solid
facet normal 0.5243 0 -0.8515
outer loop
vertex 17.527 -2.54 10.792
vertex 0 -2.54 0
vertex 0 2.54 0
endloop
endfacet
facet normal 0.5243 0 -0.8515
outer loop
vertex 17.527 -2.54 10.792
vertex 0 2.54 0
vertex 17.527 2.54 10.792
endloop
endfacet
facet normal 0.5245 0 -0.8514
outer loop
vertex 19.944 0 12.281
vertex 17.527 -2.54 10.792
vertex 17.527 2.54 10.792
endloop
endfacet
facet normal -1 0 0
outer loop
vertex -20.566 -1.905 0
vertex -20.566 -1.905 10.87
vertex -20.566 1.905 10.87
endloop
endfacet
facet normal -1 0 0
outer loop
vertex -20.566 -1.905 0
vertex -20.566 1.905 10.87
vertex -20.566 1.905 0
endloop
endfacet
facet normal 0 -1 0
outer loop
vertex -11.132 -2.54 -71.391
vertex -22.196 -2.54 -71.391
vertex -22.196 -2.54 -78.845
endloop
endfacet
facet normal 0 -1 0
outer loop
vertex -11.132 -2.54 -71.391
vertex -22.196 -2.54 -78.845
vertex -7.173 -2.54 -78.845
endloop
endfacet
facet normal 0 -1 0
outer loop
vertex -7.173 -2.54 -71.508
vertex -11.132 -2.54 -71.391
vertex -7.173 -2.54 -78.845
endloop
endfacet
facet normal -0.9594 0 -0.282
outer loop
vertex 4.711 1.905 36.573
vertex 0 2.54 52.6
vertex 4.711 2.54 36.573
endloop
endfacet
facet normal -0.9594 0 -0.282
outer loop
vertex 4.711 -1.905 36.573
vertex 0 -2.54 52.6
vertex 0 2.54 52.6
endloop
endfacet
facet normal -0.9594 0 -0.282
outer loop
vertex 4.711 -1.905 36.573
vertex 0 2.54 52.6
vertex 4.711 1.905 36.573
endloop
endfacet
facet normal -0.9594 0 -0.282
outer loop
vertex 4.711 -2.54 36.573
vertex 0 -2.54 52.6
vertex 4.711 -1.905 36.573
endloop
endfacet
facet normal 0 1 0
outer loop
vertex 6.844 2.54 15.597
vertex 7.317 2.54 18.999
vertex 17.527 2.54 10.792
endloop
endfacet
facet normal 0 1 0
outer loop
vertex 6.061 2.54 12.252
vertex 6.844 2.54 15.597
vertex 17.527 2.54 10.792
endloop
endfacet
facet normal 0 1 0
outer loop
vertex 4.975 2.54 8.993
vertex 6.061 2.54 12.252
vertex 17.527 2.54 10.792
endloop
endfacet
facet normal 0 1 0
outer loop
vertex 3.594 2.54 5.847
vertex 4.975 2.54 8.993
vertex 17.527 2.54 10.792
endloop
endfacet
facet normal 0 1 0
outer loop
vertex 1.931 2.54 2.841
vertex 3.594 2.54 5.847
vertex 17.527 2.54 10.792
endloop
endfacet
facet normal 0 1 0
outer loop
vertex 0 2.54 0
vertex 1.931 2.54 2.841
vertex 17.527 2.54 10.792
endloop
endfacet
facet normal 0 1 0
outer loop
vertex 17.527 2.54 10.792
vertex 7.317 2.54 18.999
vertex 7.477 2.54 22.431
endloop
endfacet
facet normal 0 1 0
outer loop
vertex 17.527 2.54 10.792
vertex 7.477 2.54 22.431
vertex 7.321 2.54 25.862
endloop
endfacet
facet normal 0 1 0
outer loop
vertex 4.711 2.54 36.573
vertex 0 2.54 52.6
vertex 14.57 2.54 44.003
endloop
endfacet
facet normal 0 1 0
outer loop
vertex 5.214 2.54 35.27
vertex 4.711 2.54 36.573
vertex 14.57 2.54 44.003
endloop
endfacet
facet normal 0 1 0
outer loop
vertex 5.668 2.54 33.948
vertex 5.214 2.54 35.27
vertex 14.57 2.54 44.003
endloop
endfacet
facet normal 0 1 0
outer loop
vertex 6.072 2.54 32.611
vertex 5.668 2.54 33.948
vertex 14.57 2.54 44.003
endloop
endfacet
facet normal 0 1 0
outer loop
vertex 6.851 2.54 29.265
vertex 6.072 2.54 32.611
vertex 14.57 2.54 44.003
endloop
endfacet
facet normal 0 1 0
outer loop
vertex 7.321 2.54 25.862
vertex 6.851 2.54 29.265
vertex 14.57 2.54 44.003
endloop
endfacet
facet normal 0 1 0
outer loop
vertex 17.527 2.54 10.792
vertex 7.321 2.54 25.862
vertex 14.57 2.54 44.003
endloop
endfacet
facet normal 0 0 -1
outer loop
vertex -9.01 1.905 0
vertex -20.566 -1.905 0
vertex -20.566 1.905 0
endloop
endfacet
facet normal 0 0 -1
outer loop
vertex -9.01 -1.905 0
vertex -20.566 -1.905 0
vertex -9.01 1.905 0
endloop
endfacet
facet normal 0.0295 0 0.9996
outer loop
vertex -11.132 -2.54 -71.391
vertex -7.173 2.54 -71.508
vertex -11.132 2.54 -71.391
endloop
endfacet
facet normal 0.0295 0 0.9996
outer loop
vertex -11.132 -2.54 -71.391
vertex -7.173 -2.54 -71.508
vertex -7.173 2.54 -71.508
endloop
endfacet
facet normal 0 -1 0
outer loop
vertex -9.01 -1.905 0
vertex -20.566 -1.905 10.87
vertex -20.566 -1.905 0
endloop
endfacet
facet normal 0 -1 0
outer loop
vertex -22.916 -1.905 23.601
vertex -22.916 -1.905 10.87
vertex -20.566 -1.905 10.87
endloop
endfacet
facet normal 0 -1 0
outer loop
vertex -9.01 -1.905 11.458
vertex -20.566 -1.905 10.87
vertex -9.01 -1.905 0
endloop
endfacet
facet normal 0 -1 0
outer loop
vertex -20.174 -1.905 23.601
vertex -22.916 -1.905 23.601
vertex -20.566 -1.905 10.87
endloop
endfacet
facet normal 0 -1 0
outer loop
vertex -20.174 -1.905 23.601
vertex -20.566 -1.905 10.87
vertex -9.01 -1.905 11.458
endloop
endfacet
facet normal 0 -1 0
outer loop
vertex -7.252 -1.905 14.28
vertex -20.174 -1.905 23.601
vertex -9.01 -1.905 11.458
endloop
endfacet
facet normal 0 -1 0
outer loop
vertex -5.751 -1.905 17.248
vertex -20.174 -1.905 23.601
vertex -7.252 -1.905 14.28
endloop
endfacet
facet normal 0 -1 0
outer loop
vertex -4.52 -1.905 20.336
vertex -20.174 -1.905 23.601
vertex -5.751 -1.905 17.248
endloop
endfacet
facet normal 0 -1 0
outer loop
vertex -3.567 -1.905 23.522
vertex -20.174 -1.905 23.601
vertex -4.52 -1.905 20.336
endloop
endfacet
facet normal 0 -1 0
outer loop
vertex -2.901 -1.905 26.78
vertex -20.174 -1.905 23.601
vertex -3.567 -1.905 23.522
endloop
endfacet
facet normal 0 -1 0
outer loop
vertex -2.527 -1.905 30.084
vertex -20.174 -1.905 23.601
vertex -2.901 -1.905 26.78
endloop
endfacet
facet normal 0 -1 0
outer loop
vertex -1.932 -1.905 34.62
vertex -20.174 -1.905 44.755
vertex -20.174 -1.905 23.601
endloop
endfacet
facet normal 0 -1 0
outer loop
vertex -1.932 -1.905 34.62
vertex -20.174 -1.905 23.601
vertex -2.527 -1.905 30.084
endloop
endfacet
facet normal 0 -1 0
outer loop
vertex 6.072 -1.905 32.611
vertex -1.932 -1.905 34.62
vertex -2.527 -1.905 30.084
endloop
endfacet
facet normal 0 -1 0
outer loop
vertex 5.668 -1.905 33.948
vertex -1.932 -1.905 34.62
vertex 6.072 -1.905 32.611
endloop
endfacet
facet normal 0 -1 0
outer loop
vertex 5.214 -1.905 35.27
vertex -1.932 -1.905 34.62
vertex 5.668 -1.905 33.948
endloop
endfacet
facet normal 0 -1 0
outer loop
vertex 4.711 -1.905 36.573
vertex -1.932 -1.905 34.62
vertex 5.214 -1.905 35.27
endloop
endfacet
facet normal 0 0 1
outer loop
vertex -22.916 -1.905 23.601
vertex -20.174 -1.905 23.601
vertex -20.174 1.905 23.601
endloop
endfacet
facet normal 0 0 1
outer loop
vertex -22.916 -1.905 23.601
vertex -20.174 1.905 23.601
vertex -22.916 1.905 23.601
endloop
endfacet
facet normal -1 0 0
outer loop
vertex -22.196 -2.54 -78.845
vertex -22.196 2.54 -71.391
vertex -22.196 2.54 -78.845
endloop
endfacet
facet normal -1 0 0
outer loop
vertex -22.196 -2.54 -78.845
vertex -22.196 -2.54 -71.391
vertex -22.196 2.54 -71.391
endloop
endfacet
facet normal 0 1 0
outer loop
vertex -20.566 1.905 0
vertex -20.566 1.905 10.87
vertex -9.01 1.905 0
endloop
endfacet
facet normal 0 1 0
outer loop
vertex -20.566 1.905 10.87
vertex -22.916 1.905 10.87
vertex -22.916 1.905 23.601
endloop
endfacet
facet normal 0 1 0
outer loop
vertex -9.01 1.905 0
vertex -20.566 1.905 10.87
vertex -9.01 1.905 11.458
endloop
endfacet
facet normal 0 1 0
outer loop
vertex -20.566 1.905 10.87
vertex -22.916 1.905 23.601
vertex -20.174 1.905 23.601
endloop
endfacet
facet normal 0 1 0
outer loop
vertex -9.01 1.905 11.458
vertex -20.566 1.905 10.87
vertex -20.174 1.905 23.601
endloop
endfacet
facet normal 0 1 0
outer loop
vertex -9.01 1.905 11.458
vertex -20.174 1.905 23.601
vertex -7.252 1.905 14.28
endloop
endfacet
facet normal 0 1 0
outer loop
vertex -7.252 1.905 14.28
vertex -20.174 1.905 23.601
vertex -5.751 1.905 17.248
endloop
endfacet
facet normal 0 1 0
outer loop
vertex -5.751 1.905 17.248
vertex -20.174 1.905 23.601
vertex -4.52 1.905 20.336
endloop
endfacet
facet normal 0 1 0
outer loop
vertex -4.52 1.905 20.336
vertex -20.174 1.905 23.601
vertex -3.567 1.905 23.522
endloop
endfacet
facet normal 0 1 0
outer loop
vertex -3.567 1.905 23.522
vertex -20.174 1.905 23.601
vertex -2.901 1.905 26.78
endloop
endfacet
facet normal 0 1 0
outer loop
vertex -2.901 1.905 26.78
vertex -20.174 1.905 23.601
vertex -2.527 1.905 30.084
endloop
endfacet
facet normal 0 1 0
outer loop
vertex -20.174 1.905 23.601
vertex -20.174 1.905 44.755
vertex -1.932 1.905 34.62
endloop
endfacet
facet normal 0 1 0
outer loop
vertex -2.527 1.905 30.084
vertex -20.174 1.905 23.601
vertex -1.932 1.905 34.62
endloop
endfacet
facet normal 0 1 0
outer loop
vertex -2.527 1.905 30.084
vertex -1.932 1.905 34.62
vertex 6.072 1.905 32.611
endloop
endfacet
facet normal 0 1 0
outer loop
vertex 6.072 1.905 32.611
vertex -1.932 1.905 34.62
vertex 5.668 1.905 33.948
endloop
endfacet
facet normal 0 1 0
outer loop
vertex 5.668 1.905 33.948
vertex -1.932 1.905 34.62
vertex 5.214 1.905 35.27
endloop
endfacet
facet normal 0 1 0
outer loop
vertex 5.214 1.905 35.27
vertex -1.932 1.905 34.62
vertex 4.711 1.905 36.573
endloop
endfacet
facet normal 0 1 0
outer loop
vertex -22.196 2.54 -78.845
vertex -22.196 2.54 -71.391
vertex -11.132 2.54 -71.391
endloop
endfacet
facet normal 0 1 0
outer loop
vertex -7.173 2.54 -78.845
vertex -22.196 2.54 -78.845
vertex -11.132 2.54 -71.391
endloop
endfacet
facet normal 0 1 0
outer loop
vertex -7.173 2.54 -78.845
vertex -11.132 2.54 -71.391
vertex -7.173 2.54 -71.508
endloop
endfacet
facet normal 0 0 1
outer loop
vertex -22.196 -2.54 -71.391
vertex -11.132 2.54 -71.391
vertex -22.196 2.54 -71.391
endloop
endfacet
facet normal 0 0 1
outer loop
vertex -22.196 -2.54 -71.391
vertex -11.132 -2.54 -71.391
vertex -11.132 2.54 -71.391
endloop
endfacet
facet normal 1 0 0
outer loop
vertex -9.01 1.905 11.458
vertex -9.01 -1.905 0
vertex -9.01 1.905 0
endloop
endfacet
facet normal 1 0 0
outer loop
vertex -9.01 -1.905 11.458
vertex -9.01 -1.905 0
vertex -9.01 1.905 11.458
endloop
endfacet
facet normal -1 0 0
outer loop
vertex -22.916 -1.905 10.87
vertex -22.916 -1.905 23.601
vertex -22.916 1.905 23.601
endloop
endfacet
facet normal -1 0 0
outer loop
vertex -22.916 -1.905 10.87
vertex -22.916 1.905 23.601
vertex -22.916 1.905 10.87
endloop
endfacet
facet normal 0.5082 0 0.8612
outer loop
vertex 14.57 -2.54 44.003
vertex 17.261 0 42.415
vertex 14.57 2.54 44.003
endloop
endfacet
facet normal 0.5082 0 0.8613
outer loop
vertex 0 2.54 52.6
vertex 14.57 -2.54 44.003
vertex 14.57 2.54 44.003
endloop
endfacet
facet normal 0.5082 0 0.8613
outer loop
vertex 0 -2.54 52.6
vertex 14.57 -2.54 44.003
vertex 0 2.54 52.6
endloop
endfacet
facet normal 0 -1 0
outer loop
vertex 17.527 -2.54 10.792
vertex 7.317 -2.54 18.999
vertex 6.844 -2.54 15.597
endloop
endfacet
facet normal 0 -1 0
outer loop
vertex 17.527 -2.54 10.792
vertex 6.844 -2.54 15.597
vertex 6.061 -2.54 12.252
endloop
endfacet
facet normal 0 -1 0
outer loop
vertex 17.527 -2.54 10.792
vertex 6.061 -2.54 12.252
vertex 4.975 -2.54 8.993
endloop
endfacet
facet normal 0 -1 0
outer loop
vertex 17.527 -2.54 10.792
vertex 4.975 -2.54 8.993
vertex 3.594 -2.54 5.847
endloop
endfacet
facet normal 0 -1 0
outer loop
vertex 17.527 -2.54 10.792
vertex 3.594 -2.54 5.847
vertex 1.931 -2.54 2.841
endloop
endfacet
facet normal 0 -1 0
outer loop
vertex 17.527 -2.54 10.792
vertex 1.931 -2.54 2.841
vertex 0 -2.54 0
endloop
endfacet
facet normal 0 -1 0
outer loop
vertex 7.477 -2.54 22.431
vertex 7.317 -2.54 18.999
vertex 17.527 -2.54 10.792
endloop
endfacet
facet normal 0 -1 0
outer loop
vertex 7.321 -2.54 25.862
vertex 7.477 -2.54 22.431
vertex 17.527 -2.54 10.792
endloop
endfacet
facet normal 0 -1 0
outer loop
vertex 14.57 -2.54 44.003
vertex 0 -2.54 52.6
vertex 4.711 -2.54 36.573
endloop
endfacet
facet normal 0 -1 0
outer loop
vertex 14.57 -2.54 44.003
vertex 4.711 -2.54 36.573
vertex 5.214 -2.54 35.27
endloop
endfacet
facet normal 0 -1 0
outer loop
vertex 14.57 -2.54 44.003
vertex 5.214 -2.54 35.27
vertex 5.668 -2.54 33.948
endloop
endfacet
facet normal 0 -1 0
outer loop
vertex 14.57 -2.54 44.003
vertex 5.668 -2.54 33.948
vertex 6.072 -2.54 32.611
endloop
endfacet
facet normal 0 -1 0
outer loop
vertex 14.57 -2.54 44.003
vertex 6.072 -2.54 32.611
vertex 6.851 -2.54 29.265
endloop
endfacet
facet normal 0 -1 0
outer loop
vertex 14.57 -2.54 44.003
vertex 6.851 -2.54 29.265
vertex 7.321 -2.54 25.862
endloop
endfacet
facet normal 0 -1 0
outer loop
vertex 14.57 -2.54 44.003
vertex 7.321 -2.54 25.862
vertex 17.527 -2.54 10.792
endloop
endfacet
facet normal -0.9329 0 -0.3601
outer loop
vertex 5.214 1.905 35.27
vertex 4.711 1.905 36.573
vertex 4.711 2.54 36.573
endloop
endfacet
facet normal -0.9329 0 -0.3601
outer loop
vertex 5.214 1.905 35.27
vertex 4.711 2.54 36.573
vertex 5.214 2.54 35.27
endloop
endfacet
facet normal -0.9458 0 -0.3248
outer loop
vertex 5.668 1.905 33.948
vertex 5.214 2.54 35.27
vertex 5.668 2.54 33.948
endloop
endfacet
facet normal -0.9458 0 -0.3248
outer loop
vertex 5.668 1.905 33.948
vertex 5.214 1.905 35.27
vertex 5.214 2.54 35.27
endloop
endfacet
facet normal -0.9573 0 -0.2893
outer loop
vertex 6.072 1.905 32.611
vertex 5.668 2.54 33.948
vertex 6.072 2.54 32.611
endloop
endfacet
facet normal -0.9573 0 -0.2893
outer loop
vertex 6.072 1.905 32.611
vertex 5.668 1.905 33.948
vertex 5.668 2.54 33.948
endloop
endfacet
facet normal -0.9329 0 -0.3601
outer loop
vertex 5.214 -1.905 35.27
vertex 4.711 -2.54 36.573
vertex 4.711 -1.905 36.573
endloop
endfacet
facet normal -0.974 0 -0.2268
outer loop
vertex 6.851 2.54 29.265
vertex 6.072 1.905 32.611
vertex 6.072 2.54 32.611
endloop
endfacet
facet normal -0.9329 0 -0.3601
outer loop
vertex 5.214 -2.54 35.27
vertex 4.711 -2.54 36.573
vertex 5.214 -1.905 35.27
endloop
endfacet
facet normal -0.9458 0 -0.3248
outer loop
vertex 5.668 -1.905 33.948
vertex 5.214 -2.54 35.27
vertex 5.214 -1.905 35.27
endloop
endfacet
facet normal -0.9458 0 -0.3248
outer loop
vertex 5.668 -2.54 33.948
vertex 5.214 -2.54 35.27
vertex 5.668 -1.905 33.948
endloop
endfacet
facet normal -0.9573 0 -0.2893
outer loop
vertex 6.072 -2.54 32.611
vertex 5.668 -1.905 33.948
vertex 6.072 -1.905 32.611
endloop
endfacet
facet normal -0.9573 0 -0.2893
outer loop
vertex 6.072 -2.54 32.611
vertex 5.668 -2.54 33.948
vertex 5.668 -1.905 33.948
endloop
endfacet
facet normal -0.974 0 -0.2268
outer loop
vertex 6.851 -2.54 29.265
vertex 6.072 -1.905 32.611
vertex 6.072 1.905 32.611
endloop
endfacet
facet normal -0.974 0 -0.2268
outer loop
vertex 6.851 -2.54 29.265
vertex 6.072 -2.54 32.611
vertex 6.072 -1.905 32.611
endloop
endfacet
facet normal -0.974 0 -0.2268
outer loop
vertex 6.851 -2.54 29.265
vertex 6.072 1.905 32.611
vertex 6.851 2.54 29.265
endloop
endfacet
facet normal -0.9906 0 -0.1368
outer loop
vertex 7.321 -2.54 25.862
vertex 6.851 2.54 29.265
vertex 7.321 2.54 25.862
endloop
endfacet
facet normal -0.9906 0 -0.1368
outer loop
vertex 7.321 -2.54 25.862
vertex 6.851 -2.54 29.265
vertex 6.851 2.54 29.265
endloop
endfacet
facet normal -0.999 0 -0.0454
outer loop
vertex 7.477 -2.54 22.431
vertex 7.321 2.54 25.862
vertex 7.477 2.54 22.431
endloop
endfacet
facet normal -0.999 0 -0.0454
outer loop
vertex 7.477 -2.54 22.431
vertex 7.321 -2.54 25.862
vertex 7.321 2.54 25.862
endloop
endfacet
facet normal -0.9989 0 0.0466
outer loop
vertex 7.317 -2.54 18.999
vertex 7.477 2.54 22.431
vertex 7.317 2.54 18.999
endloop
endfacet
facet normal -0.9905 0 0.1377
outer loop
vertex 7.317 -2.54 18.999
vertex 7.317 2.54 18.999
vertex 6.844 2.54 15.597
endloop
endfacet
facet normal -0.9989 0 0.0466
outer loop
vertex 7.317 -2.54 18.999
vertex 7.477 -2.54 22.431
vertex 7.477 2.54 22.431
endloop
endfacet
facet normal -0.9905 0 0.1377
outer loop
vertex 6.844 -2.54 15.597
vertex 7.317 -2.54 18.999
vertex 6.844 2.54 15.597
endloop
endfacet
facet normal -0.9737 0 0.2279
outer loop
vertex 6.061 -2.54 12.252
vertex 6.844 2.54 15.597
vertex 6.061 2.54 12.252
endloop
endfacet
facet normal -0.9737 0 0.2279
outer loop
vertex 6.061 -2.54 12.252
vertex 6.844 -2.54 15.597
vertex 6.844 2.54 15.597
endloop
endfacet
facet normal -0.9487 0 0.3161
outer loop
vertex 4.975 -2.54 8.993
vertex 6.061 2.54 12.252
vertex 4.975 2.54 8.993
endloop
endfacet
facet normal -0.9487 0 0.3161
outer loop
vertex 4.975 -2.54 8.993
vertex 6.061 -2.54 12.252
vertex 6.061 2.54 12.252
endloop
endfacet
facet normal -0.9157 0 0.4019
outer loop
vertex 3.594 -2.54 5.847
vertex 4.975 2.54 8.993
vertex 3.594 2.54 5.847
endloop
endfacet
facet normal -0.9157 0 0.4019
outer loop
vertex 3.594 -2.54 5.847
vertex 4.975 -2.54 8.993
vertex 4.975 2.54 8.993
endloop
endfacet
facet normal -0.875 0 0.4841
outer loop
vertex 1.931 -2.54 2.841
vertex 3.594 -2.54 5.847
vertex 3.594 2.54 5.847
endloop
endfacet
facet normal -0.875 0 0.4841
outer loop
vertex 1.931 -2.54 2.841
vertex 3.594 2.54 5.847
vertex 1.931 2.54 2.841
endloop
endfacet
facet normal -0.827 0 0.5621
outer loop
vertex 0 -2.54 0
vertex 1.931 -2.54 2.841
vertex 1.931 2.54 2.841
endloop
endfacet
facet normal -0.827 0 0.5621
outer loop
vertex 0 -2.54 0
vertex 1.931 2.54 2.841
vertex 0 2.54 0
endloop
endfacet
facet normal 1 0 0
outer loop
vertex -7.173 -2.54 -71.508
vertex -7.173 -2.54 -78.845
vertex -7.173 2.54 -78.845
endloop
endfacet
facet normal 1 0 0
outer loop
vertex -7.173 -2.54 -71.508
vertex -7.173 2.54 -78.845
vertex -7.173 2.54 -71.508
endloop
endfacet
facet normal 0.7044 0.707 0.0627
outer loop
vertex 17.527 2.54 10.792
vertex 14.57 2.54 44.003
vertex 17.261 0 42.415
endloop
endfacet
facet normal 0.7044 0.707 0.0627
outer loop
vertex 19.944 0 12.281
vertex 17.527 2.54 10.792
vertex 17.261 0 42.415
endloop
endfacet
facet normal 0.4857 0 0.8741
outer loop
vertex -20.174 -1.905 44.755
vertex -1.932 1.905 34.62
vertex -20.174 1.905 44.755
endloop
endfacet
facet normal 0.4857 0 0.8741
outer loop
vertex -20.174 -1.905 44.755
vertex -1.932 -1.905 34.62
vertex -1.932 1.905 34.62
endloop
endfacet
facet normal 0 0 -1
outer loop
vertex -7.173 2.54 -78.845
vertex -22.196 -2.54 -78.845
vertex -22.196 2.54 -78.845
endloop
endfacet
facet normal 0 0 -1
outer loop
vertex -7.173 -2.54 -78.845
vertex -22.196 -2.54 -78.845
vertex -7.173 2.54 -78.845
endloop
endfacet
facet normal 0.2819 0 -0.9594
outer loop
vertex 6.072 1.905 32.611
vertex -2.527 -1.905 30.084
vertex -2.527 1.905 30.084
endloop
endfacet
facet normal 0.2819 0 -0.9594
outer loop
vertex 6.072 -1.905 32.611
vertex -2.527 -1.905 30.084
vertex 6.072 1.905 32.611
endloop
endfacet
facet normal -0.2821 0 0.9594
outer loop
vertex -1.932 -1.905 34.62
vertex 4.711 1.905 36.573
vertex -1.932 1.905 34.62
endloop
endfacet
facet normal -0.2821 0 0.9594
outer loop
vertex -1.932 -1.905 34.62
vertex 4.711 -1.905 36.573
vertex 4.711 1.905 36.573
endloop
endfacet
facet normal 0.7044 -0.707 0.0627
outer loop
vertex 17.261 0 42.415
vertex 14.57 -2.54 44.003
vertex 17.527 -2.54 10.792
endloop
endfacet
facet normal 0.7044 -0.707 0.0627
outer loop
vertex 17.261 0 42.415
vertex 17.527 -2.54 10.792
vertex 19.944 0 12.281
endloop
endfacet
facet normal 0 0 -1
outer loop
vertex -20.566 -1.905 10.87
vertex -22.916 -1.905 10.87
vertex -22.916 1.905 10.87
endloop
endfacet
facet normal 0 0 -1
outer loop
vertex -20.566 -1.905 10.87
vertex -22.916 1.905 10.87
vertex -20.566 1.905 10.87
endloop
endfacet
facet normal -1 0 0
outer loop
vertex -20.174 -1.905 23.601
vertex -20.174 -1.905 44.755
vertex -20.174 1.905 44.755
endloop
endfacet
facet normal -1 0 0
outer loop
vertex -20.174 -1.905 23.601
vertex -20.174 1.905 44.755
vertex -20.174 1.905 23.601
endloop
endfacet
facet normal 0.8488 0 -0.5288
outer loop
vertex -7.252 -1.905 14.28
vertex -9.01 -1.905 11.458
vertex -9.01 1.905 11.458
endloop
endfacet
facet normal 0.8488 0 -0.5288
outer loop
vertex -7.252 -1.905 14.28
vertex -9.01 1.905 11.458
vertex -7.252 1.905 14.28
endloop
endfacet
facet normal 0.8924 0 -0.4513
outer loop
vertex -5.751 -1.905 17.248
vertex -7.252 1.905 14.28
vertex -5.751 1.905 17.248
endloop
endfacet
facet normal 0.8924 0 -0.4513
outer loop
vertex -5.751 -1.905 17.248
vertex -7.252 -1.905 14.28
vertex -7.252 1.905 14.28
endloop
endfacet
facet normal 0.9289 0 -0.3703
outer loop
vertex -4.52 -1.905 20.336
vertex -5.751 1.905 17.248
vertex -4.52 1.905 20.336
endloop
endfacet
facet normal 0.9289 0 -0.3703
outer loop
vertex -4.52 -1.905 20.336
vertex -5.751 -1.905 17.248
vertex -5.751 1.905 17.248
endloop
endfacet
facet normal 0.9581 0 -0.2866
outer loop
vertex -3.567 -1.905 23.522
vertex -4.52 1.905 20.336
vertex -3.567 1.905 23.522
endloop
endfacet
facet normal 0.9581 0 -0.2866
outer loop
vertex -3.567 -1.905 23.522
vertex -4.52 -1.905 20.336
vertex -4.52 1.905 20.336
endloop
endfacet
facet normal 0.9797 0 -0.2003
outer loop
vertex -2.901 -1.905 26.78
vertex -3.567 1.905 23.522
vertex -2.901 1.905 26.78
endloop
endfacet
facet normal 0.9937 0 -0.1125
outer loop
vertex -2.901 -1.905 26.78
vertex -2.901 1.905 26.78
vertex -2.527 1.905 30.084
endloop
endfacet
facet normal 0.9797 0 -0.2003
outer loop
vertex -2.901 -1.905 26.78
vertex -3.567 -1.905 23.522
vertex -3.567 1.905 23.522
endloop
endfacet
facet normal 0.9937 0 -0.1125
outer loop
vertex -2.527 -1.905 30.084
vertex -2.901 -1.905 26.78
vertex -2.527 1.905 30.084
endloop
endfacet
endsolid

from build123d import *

# Parameters (mm, degrees)
F3_DEPTH    = 1.905
F4_DEPTH    = 2.54
F5_T1_DEPTH = 48.3053442814
F6_DEPTH    = 2.54


# Not quite as in the source:
# - a fillet or chamfer that OpenCascade refuses, or shapes differently, is made with other operations: its cross-section is extruded or revolved along the edge and cut away or added
# - the program builds the solid bodies; features that only make, move or delete a surface that nothing else refers to are left out


with BuildPart() as f3:
    # F0 (on Front) → F3 (new body, symmetric)
    with BuildSketch(Plane.XZ):
        with BuildLine():
            Line((-1.9319759193, 34.6202871443), (-20.1738812029, 44.7546765208))
            Line((-20.1738812029, 44.7546765208), (-20.1738812029, 23.6014798284))
            Line((-20.1738812029, 23.6014798284), (-22.9159612209, 23.6014798284))
            Line((-22.9159612209, 23.6014798284), (-22.9159612209, 10.8703924343))
            Line((-22.9159612209, 10.8703924343), (-20.5656066537, 10.8703924343))
            Line((-20.5656066537, 10.8703924343), (-20.5656066537, 0))
            Line((-20.5656066537, 0), (-18.231138587, 0))
            Line((-18.231138587, 0), (-14.9366050027, 0))
            Line((-14.9366050027, 0), (-11.6420714185, 0))
            Line((-11.6420714185, 0), (-11.3464937492, 0))
            Line((-11.3464937492, 0), (-9.0096937492, 0))
            Line((-9.0096937492, 0), (-9.0096937492, 11.4579806104))
            ThreePointArc((-9.0096937492, 11.4579806104), (-4.5198612968, 20.3362668162), (-2.5268969009, 30.0836077008))
            Line((-2.5268969009, 30.0836077008), (6.0717510059, 32.6111763716))
            ThreePointArc((6.0717510059, 32.6111763716), (5.4469320969, 34.6111548057), (4.7112164165, 36.5730505327))
            Line((4.7112164165, 36.5730505327), (-1.9319759193, 34.6202871443))
        make_face()
    extrude(amount=F3_DEPTH, both=True)

    # F0 (on Front) → F4 (join, symmetric)
    with BuildSketch(Plane.XZ):
        with BuildLine():
            Line((0, 52.6003465056), (4.7112164165, 36.5730505327))
            ThreePointArc((4.7112164165, 36.5730505327), (5.4469320969, 34.6111548057), (6.0717510059, 32.6111763716))
            ThreePointArc((6.0717510059, 32.6111763716), (6.8442642331, 15.59651876), (0, 0))
            Line((0, 0), (21.1531929672, 13.0248842761))
            Line((21.1531929672, 13.0248842761), (18.6069775373, 41.6208691895))
            Line((18.6069775373, 41.6208691895), (0, 52.6003465056))
        make_face()
    extrude(amount=F4_DEPTH, both=True)

    # F5: chamfer of 3.81 on 2 edges, made by hand

    # F5_s2 → F5_t1 (cut)
    with BuildSketch(Plane(origin=(-0.1152408587, 0, 1.2942447122), x_dir=(0, 1, 0), z_dir=(-0.0886901249, 0, 0.9960592662))):
        Polygon((-2.54, -18.4150124772), (1.27, -22.2250124772), (-2.54, -22.2250124772), align=None)
        Polygon((2.54, -18.4150124772), (-1.27, -22.2250124772), (2.54, -22.2250124772), align=None)
    extrude(amount=F5_T1_DEPTH, mode=Mode.SUBTRACT)


with BuildPart() as f6:
    # F0 (on Front) → F6 (new body, symmetric)
    with BuildSketch(Plane.XZ):
        Polygon((-14.7427194752, -78.8446590304), (-14.7427194752, -71.3911727071), (-18.3530040085, -71.3911727071), (-22.1962090582, -71.3911727071), (-22.1962090582, -78.8446590304), align=None)
        Polygon((-11.1324349418, -71.3911727071), (-14.7427194752, -71.3911727071), (-14.7427194752, -78.8446590304), (-7.1727680042, -78.8446590304), (-7.1727680042, -71.5076327324), align=None)
    extrude(amount=F6_DEPTH, both=True)


solid = Compound([f3.part, f6.part])
